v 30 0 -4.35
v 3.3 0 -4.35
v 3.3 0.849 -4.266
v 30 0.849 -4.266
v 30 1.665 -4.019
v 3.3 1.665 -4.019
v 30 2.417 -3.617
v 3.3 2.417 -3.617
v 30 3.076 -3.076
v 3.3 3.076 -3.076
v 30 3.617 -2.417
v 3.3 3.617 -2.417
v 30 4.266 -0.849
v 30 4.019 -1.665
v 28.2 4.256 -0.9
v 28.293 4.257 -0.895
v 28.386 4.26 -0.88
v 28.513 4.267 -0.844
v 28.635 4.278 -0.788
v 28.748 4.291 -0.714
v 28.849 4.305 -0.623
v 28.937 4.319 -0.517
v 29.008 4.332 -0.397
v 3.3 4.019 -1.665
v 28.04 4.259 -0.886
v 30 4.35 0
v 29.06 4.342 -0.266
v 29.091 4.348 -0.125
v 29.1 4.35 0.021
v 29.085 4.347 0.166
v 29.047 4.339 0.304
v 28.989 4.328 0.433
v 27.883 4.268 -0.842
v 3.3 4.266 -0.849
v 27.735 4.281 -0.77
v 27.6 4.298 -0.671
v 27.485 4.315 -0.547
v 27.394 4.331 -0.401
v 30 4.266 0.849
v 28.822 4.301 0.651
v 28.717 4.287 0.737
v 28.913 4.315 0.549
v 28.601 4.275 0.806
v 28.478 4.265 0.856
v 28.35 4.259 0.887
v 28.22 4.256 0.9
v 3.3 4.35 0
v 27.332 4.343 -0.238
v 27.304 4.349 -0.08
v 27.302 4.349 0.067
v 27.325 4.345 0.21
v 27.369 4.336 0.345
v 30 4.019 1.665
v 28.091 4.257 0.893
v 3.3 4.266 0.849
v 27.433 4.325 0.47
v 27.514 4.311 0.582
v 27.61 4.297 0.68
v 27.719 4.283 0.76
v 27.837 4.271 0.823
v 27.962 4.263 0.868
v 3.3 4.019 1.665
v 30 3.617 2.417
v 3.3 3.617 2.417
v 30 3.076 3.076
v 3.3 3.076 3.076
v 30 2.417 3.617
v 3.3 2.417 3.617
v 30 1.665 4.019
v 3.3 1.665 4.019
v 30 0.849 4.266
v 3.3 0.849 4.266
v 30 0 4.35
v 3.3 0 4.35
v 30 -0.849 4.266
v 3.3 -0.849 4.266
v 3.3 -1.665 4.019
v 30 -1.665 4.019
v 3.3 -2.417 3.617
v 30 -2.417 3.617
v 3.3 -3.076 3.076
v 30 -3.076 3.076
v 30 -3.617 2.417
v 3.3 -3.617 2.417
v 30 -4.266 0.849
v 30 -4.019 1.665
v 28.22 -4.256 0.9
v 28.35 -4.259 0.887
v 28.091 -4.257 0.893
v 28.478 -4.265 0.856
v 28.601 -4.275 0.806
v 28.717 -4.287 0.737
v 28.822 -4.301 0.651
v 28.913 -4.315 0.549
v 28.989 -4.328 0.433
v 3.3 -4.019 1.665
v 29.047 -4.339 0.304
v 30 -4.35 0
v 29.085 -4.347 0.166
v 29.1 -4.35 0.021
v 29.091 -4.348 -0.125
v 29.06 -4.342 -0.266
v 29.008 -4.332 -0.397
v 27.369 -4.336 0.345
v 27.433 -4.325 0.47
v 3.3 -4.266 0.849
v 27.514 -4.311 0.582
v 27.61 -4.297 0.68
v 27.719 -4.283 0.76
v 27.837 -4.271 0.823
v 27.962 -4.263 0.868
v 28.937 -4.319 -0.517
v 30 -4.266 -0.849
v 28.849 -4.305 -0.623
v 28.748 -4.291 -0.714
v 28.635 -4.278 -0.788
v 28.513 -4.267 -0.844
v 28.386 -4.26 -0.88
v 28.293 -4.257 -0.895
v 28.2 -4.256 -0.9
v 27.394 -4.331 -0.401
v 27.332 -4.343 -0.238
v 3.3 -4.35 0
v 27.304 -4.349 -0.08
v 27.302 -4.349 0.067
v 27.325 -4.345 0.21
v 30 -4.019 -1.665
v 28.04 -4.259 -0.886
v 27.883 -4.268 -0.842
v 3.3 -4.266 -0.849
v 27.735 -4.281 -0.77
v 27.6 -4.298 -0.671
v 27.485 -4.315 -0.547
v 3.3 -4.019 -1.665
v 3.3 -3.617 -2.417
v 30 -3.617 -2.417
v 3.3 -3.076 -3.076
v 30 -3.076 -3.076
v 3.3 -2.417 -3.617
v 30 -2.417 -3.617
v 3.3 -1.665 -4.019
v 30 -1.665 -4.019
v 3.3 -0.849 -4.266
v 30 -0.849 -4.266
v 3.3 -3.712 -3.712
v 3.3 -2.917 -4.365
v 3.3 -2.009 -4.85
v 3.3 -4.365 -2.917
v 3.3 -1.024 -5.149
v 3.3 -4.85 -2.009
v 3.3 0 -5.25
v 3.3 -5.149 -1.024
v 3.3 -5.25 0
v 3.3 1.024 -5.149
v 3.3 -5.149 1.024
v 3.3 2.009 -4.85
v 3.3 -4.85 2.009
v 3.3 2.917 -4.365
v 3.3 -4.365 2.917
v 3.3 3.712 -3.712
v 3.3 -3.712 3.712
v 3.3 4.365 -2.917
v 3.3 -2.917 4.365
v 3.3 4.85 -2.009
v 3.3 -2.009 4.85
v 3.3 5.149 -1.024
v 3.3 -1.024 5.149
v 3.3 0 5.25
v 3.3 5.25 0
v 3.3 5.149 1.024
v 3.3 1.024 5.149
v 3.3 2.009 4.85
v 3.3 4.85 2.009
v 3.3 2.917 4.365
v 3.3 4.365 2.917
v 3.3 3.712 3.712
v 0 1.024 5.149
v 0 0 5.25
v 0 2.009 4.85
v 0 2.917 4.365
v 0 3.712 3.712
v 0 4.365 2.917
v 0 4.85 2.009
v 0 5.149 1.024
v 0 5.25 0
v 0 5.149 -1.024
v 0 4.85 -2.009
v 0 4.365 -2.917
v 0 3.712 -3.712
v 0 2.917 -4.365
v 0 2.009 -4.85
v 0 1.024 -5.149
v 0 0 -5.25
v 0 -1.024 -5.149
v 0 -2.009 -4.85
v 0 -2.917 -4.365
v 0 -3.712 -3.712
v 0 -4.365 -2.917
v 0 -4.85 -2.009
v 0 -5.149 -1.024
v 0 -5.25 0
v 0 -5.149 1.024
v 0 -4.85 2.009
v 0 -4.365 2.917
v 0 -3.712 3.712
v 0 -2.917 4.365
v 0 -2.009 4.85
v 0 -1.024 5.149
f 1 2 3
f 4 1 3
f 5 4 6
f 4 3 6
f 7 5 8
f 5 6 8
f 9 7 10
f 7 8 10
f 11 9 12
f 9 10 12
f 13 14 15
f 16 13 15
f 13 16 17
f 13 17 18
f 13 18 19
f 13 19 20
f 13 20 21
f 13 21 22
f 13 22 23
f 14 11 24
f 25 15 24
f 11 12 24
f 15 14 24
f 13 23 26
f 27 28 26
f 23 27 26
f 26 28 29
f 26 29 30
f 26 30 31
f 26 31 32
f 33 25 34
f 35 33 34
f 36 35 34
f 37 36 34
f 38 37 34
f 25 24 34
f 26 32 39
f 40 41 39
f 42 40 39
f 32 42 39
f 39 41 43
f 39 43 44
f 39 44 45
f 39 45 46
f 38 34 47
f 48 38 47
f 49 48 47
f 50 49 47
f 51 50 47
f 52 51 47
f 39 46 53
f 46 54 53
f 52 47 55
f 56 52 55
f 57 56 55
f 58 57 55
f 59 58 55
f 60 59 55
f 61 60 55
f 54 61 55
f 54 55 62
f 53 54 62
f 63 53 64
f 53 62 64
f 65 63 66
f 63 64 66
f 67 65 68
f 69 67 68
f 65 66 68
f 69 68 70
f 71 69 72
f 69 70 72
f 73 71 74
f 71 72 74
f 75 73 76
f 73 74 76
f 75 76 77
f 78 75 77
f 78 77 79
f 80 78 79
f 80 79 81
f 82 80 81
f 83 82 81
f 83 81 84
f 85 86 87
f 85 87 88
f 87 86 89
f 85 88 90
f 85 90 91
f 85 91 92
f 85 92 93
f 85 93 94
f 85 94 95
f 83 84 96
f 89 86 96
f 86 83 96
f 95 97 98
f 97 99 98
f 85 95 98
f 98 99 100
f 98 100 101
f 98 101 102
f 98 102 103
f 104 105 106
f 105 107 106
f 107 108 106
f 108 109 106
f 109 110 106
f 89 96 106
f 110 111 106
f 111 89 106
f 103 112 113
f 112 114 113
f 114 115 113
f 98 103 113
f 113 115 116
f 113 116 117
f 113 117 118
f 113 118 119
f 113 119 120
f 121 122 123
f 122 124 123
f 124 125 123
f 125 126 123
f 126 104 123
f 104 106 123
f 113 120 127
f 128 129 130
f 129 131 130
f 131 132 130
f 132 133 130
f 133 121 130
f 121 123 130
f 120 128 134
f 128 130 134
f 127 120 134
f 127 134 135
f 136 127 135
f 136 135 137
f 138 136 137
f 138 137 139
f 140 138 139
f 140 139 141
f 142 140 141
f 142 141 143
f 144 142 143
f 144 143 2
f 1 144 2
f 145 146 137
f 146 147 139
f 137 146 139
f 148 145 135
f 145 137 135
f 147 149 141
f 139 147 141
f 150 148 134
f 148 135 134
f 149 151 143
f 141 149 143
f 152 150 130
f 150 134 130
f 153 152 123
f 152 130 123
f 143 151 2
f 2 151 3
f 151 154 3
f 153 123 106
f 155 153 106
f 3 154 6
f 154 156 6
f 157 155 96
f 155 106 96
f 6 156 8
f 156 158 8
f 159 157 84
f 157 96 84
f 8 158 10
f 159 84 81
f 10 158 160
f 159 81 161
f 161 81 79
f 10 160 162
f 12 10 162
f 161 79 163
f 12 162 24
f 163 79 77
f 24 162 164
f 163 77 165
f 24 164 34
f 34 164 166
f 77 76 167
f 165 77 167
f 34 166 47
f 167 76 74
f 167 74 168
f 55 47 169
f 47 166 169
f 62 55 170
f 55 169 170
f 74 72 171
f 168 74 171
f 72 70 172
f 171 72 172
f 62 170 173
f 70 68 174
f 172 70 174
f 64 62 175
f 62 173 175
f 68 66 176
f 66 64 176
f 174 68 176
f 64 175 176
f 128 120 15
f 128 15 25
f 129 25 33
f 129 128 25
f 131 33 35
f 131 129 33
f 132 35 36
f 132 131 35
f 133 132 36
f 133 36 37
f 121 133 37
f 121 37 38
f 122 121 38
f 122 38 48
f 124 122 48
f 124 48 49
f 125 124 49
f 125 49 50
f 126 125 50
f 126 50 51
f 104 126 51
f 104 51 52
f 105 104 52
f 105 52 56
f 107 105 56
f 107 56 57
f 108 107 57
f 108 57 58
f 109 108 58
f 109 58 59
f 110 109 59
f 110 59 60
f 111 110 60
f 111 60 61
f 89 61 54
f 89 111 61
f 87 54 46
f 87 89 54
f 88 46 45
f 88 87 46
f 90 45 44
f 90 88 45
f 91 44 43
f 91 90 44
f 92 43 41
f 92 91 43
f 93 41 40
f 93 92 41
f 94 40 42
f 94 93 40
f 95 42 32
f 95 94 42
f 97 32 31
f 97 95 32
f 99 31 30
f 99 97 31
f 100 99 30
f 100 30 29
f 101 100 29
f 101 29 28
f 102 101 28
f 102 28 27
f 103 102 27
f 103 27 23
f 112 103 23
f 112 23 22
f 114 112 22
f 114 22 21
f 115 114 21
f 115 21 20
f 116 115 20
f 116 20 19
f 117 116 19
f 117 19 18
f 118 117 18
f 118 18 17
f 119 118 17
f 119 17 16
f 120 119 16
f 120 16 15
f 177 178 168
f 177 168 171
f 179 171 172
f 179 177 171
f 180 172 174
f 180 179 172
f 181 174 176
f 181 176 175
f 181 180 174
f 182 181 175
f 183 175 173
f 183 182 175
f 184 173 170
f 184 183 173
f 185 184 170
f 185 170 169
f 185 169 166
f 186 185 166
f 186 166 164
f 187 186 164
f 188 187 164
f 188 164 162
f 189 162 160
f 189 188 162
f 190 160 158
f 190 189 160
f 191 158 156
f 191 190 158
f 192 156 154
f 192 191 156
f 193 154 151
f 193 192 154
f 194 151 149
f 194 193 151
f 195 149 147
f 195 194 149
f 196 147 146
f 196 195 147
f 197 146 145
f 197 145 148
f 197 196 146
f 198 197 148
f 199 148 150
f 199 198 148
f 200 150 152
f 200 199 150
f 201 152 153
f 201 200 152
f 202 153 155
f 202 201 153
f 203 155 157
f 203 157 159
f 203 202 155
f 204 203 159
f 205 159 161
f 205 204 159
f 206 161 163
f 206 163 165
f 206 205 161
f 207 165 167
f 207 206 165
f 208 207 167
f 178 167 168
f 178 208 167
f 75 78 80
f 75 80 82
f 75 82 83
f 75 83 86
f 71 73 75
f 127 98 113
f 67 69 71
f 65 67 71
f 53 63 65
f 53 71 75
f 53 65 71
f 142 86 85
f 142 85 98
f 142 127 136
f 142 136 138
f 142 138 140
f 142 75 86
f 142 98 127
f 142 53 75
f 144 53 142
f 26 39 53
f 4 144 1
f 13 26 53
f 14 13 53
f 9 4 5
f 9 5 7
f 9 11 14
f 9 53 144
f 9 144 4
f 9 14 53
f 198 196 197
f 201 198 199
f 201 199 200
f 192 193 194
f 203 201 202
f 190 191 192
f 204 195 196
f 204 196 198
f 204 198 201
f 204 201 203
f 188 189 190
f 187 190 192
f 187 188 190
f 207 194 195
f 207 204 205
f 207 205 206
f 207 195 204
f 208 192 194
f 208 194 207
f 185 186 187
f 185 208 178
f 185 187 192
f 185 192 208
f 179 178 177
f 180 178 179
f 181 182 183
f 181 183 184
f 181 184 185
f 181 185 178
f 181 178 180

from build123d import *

# Parameters (mm, degrees)
SKETCH1_R               = 2.9
BOSS_EXTRUDE1_DEPTH     = 20
CUT_EXTRUDE1_DEPTH      = 10
CUT_EXTRUDE1_DEPTH_BACK = 10
SKETCH2_R               = 0.6
SKETCH3_R               = 3.5
BOSS_EXTRUDE2_DEPTH     = 2.2
SCALE1_SCALE            = 1.5


with BuildPart() as part:
    # Sketch1 → Boss-Extrude1 (new body)
    with BuildSketch(Plane(origin=(0, 0, 0), x_dir=(0, 0, -1), z_dir=(1, 0, 0))):
        Circle(SKETCH1_R)
    extrude(amount=BOSS_EXTRUDE1_DEPTH)

    # Sketch2 → Cut-Extrude1 (cut, two sides: drawn at the far end of the back side and taken through both)
    with BuildSketch(Plane(origin=(0, 0, 0), x_dir=(1, 0, 0), z_dir=(0, 1, 0)).offset(-CUT_EXTRUDE1_DEPTH_BACK)):
        with Locations((18.8, 0)):
            Circle(SKETCH2_R)
    extrude(amount=CUT_EXTRUDE1_DEPTH + CUT_EXTRUDE1_DEPTH_BACK, mode=Mode.SUBTRACT)

    # Sketch3 → Boss-Extrude2 (add)
    with BuildSketch(Plane.ZY):
        Circle(SKETCH3_R)
    extrude(amount=-BOSS_EXTRUDE2_DEPTH)


with BuildPart() as part_1:
    # Scale1: scaled about (0, 0, 0)
    add(part.part.scale(SCALE1_SCALE))


solid = part_1.part
